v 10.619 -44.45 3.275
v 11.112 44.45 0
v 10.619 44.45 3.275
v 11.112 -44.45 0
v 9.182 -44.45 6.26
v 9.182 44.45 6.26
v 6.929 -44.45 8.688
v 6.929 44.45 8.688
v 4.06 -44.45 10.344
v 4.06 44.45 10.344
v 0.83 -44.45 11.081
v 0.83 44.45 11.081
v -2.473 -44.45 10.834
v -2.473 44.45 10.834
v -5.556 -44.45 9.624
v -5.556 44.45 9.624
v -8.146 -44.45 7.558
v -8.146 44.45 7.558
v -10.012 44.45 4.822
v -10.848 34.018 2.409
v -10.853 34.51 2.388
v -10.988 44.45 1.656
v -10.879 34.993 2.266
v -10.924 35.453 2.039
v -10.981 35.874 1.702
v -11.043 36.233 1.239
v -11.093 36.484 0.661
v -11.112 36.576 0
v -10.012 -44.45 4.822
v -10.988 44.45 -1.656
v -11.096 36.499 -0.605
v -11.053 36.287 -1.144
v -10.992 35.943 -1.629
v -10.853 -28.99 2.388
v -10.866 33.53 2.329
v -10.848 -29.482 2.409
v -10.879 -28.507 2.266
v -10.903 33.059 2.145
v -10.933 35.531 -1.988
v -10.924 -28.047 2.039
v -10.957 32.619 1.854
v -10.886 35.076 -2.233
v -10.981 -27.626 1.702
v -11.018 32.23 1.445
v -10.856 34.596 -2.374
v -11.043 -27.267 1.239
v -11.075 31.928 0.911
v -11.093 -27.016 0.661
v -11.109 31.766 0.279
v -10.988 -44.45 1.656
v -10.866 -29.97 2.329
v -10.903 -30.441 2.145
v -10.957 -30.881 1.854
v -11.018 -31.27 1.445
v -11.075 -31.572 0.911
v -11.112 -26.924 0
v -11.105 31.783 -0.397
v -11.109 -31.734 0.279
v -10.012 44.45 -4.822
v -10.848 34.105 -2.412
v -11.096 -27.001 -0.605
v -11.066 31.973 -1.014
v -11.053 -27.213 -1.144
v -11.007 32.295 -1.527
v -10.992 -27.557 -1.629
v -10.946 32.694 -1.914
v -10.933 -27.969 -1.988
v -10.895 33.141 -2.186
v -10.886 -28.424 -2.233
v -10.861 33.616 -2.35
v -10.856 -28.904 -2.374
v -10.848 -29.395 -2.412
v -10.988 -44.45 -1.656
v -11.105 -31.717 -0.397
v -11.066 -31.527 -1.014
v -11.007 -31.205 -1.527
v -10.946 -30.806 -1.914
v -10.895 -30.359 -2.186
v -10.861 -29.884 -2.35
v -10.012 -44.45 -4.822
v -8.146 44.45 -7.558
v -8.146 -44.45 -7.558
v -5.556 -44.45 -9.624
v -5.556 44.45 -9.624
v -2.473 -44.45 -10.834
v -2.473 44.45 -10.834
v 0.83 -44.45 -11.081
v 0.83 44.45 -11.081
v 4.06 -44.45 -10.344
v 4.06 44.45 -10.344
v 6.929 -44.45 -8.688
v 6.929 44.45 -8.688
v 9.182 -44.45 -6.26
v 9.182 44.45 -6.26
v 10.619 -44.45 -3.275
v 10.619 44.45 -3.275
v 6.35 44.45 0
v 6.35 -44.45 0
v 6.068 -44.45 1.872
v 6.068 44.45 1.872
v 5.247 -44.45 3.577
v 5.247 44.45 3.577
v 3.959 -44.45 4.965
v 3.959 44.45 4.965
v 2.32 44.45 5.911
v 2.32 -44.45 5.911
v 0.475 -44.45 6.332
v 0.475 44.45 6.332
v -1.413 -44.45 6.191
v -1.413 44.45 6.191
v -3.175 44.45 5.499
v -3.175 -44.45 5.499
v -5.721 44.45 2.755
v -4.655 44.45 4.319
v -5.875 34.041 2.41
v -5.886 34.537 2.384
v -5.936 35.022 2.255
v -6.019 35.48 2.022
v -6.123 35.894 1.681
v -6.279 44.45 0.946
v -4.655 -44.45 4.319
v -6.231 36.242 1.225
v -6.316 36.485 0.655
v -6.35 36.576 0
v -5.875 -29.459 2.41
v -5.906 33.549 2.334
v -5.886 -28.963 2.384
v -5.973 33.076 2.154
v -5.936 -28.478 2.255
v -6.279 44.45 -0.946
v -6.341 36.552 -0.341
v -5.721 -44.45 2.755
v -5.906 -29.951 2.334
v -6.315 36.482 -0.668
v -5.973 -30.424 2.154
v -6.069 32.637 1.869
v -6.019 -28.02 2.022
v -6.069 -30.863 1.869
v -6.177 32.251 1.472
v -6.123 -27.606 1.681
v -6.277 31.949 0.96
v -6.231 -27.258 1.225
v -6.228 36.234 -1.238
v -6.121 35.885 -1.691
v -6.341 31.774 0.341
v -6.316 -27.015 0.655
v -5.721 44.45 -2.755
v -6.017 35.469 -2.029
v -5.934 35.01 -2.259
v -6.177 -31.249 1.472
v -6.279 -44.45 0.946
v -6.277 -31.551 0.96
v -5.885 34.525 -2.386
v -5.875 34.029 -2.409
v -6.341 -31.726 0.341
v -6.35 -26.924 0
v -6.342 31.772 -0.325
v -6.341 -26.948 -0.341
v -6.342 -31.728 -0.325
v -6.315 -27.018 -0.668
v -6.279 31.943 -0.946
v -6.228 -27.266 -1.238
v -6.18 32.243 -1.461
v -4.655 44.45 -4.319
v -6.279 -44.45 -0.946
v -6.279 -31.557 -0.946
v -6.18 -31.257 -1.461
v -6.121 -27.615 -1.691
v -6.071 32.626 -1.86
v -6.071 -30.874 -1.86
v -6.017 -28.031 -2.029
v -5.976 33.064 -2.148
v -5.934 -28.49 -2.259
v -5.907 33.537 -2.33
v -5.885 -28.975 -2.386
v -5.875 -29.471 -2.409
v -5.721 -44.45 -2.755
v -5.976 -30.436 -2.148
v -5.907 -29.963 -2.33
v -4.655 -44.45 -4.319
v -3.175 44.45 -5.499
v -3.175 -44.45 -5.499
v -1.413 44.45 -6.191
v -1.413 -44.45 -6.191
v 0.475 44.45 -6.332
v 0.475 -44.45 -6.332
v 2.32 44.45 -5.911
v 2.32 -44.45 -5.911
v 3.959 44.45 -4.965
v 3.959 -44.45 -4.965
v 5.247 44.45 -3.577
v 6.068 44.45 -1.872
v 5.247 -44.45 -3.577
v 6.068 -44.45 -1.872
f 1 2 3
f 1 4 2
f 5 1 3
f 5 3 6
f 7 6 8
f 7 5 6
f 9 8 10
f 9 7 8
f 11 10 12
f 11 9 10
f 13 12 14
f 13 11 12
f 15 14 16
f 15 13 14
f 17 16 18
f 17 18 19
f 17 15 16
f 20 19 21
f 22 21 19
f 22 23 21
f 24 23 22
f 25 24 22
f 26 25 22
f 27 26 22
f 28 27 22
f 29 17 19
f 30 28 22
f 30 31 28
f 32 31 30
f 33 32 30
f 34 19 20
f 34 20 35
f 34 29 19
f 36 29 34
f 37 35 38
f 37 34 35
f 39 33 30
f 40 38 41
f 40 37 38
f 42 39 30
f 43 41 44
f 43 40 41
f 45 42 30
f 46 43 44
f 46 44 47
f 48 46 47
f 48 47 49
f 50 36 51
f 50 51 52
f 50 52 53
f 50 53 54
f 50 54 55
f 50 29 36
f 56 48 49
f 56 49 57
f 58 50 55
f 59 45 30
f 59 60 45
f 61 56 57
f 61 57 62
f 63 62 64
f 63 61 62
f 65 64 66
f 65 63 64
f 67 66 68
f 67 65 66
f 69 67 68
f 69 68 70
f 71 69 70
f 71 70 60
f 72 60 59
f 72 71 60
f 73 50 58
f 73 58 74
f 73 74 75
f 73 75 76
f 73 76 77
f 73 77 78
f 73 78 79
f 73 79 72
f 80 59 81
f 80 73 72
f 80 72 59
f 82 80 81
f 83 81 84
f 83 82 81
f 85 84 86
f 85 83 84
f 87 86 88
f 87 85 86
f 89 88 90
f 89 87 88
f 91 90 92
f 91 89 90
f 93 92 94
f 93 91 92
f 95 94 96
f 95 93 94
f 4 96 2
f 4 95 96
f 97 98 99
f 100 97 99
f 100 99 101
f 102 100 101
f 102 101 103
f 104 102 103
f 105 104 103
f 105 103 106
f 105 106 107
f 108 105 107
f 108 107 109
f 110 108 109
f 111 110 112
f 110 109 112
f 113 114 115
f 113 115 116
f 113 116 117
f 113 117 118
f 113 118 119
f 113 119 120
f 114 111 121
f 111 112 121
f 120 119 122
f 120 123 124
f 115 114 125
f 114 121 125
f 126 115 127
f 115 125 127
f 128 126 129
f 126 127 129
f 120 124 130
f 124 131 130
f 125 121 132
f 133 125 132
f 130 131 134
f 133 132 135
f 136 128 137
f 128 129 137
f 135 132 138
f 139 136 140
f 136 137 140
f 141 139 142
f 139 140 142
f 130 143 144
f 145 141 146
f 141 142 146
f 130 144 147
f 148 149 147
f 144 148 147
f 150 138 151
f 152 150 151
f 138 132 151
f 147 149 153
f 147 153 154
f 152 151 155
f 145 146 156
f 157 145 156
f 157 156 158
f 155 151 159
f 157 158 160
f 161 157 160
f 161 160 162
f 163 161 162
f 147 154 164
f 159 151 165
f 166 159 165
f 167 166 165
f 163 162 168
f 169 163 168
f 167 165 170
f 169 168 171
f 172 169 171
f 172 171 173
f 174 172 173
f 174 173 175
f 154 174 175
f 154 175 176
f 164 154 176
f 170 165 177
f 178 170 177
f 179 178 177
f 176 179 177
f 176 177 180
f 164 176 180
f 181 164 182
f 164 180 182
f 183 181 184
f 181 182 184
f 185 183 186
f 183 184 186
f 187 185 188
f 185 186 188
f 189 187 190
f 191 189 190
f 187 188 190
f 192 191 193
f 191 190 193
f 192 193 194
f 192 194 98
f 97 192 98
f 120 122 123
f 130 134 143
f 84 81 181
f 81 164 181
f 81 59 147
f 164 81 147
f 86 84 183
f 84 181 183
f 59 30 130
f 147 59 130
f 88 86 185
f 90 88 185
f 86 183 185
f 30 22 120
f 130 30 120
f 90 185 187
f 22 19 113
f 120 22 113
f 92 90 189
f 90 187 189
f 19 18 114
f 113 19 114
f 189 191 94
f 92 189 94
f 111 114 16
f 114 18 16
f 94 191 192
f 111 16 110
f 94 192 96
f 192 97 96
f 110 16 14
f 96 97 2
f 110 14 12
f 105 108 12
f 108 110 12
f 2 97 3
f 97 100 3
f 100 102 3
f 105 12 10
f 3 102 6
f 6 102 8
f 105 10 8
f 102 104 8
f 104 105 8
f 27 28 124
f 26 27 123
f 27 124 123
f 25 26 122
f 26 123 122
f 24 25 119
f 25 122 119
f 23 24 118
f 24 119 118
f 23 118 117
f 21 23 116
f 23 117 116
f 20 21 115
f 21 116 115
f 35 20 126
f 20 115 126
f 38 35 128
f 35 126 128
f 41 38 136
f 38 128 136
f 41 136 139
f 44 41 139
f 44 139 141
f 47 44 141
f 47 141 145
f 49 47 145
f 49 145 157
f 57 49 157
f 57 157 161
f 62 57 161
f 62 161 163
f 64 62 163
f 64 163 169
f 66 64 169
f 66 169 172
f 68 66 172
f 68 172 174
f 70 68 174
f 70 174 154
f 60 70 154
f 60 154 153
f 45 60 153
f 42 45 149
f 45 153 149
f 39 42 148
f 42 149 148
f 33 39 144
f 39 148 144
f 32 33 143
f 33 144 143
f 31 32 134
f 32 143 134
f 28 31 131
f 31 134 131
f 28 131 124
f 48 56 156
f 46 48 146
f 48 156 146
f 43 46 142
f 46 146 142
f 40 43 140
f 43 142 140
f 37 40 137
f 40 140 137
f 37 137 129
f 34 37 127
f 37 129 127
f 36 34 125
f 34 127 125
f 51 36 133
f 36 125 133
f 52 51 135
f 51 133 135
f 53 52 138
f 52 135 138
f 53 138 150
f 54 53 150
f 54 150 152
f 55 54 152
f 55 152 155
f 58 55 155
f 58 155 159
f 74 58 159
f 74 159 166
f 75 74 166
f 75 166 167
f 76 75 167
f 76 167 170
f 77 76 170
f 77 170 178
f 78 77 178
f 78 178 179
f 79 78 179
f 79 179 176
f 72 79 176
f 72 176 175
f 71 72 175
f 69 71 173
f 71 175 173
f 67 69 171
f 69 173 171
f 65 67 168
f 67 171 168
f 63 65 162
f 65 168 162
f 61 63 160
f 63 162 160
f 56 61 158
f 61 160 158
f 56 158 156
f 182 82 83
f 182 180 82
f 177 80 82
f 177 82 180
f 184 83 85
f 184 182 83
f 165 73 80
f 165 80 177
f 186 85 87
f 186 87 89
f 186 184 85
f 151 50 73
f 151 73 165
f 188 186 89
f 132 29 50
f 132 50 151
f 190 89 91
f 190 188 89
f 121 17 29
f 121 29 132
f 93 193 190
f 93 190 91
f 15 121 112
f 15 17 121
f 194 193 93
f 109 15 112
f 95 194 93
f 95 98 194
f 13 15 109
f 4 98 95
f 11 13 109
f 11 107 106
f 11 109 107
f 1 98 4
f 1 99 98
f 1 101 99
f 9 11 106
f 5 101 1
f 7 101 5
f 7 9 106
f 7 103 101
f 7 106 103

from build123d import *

# Parameters (mm, degrees)
F0_R     = 11.1125
F1_DEPTH = 44.45
F2_R     = 6.35
F3_DEPTH = 88.9
F4_R     = 2.413
F5_DEPTH = 25.4
F6_R     = 2.413
F7_DEPTH = 25.4


with BuildPart() as f1:
    # F0 (on Front) → F1 (new body, symmetric)
    with BuildSketch(Plane.XZ):
        Circle(F0_R)
    extrude(amount=F1_DEPTH, both=True)

    # F2 (on face) → F3 (cut)
    with BuildSketch(Plane.XZ.offset(44.45)):
        Circle(F2_R)
    extrude(amount=-F3_DEPTH, mode=Mode.SUBTRACT)

    # F4 (on Right) → F5 (cut)
    with BuildSketch(Plane.YZ):
        with Locations((-29.337, 0)):
            Circle(F4_R)
    extrude(amount=-F5_DEPTH, mode=Mode.SUBTRACT)

    # F6 (on Right) → F7 (cut)
    with BuildSketch(Plane.YZ):
        with Locations((34.163, 0)):
            Circle(F6_R)
    extrude(amount=-F7_DEPTH, mode=Mode.SUBTRACT)


solid = f1.part
